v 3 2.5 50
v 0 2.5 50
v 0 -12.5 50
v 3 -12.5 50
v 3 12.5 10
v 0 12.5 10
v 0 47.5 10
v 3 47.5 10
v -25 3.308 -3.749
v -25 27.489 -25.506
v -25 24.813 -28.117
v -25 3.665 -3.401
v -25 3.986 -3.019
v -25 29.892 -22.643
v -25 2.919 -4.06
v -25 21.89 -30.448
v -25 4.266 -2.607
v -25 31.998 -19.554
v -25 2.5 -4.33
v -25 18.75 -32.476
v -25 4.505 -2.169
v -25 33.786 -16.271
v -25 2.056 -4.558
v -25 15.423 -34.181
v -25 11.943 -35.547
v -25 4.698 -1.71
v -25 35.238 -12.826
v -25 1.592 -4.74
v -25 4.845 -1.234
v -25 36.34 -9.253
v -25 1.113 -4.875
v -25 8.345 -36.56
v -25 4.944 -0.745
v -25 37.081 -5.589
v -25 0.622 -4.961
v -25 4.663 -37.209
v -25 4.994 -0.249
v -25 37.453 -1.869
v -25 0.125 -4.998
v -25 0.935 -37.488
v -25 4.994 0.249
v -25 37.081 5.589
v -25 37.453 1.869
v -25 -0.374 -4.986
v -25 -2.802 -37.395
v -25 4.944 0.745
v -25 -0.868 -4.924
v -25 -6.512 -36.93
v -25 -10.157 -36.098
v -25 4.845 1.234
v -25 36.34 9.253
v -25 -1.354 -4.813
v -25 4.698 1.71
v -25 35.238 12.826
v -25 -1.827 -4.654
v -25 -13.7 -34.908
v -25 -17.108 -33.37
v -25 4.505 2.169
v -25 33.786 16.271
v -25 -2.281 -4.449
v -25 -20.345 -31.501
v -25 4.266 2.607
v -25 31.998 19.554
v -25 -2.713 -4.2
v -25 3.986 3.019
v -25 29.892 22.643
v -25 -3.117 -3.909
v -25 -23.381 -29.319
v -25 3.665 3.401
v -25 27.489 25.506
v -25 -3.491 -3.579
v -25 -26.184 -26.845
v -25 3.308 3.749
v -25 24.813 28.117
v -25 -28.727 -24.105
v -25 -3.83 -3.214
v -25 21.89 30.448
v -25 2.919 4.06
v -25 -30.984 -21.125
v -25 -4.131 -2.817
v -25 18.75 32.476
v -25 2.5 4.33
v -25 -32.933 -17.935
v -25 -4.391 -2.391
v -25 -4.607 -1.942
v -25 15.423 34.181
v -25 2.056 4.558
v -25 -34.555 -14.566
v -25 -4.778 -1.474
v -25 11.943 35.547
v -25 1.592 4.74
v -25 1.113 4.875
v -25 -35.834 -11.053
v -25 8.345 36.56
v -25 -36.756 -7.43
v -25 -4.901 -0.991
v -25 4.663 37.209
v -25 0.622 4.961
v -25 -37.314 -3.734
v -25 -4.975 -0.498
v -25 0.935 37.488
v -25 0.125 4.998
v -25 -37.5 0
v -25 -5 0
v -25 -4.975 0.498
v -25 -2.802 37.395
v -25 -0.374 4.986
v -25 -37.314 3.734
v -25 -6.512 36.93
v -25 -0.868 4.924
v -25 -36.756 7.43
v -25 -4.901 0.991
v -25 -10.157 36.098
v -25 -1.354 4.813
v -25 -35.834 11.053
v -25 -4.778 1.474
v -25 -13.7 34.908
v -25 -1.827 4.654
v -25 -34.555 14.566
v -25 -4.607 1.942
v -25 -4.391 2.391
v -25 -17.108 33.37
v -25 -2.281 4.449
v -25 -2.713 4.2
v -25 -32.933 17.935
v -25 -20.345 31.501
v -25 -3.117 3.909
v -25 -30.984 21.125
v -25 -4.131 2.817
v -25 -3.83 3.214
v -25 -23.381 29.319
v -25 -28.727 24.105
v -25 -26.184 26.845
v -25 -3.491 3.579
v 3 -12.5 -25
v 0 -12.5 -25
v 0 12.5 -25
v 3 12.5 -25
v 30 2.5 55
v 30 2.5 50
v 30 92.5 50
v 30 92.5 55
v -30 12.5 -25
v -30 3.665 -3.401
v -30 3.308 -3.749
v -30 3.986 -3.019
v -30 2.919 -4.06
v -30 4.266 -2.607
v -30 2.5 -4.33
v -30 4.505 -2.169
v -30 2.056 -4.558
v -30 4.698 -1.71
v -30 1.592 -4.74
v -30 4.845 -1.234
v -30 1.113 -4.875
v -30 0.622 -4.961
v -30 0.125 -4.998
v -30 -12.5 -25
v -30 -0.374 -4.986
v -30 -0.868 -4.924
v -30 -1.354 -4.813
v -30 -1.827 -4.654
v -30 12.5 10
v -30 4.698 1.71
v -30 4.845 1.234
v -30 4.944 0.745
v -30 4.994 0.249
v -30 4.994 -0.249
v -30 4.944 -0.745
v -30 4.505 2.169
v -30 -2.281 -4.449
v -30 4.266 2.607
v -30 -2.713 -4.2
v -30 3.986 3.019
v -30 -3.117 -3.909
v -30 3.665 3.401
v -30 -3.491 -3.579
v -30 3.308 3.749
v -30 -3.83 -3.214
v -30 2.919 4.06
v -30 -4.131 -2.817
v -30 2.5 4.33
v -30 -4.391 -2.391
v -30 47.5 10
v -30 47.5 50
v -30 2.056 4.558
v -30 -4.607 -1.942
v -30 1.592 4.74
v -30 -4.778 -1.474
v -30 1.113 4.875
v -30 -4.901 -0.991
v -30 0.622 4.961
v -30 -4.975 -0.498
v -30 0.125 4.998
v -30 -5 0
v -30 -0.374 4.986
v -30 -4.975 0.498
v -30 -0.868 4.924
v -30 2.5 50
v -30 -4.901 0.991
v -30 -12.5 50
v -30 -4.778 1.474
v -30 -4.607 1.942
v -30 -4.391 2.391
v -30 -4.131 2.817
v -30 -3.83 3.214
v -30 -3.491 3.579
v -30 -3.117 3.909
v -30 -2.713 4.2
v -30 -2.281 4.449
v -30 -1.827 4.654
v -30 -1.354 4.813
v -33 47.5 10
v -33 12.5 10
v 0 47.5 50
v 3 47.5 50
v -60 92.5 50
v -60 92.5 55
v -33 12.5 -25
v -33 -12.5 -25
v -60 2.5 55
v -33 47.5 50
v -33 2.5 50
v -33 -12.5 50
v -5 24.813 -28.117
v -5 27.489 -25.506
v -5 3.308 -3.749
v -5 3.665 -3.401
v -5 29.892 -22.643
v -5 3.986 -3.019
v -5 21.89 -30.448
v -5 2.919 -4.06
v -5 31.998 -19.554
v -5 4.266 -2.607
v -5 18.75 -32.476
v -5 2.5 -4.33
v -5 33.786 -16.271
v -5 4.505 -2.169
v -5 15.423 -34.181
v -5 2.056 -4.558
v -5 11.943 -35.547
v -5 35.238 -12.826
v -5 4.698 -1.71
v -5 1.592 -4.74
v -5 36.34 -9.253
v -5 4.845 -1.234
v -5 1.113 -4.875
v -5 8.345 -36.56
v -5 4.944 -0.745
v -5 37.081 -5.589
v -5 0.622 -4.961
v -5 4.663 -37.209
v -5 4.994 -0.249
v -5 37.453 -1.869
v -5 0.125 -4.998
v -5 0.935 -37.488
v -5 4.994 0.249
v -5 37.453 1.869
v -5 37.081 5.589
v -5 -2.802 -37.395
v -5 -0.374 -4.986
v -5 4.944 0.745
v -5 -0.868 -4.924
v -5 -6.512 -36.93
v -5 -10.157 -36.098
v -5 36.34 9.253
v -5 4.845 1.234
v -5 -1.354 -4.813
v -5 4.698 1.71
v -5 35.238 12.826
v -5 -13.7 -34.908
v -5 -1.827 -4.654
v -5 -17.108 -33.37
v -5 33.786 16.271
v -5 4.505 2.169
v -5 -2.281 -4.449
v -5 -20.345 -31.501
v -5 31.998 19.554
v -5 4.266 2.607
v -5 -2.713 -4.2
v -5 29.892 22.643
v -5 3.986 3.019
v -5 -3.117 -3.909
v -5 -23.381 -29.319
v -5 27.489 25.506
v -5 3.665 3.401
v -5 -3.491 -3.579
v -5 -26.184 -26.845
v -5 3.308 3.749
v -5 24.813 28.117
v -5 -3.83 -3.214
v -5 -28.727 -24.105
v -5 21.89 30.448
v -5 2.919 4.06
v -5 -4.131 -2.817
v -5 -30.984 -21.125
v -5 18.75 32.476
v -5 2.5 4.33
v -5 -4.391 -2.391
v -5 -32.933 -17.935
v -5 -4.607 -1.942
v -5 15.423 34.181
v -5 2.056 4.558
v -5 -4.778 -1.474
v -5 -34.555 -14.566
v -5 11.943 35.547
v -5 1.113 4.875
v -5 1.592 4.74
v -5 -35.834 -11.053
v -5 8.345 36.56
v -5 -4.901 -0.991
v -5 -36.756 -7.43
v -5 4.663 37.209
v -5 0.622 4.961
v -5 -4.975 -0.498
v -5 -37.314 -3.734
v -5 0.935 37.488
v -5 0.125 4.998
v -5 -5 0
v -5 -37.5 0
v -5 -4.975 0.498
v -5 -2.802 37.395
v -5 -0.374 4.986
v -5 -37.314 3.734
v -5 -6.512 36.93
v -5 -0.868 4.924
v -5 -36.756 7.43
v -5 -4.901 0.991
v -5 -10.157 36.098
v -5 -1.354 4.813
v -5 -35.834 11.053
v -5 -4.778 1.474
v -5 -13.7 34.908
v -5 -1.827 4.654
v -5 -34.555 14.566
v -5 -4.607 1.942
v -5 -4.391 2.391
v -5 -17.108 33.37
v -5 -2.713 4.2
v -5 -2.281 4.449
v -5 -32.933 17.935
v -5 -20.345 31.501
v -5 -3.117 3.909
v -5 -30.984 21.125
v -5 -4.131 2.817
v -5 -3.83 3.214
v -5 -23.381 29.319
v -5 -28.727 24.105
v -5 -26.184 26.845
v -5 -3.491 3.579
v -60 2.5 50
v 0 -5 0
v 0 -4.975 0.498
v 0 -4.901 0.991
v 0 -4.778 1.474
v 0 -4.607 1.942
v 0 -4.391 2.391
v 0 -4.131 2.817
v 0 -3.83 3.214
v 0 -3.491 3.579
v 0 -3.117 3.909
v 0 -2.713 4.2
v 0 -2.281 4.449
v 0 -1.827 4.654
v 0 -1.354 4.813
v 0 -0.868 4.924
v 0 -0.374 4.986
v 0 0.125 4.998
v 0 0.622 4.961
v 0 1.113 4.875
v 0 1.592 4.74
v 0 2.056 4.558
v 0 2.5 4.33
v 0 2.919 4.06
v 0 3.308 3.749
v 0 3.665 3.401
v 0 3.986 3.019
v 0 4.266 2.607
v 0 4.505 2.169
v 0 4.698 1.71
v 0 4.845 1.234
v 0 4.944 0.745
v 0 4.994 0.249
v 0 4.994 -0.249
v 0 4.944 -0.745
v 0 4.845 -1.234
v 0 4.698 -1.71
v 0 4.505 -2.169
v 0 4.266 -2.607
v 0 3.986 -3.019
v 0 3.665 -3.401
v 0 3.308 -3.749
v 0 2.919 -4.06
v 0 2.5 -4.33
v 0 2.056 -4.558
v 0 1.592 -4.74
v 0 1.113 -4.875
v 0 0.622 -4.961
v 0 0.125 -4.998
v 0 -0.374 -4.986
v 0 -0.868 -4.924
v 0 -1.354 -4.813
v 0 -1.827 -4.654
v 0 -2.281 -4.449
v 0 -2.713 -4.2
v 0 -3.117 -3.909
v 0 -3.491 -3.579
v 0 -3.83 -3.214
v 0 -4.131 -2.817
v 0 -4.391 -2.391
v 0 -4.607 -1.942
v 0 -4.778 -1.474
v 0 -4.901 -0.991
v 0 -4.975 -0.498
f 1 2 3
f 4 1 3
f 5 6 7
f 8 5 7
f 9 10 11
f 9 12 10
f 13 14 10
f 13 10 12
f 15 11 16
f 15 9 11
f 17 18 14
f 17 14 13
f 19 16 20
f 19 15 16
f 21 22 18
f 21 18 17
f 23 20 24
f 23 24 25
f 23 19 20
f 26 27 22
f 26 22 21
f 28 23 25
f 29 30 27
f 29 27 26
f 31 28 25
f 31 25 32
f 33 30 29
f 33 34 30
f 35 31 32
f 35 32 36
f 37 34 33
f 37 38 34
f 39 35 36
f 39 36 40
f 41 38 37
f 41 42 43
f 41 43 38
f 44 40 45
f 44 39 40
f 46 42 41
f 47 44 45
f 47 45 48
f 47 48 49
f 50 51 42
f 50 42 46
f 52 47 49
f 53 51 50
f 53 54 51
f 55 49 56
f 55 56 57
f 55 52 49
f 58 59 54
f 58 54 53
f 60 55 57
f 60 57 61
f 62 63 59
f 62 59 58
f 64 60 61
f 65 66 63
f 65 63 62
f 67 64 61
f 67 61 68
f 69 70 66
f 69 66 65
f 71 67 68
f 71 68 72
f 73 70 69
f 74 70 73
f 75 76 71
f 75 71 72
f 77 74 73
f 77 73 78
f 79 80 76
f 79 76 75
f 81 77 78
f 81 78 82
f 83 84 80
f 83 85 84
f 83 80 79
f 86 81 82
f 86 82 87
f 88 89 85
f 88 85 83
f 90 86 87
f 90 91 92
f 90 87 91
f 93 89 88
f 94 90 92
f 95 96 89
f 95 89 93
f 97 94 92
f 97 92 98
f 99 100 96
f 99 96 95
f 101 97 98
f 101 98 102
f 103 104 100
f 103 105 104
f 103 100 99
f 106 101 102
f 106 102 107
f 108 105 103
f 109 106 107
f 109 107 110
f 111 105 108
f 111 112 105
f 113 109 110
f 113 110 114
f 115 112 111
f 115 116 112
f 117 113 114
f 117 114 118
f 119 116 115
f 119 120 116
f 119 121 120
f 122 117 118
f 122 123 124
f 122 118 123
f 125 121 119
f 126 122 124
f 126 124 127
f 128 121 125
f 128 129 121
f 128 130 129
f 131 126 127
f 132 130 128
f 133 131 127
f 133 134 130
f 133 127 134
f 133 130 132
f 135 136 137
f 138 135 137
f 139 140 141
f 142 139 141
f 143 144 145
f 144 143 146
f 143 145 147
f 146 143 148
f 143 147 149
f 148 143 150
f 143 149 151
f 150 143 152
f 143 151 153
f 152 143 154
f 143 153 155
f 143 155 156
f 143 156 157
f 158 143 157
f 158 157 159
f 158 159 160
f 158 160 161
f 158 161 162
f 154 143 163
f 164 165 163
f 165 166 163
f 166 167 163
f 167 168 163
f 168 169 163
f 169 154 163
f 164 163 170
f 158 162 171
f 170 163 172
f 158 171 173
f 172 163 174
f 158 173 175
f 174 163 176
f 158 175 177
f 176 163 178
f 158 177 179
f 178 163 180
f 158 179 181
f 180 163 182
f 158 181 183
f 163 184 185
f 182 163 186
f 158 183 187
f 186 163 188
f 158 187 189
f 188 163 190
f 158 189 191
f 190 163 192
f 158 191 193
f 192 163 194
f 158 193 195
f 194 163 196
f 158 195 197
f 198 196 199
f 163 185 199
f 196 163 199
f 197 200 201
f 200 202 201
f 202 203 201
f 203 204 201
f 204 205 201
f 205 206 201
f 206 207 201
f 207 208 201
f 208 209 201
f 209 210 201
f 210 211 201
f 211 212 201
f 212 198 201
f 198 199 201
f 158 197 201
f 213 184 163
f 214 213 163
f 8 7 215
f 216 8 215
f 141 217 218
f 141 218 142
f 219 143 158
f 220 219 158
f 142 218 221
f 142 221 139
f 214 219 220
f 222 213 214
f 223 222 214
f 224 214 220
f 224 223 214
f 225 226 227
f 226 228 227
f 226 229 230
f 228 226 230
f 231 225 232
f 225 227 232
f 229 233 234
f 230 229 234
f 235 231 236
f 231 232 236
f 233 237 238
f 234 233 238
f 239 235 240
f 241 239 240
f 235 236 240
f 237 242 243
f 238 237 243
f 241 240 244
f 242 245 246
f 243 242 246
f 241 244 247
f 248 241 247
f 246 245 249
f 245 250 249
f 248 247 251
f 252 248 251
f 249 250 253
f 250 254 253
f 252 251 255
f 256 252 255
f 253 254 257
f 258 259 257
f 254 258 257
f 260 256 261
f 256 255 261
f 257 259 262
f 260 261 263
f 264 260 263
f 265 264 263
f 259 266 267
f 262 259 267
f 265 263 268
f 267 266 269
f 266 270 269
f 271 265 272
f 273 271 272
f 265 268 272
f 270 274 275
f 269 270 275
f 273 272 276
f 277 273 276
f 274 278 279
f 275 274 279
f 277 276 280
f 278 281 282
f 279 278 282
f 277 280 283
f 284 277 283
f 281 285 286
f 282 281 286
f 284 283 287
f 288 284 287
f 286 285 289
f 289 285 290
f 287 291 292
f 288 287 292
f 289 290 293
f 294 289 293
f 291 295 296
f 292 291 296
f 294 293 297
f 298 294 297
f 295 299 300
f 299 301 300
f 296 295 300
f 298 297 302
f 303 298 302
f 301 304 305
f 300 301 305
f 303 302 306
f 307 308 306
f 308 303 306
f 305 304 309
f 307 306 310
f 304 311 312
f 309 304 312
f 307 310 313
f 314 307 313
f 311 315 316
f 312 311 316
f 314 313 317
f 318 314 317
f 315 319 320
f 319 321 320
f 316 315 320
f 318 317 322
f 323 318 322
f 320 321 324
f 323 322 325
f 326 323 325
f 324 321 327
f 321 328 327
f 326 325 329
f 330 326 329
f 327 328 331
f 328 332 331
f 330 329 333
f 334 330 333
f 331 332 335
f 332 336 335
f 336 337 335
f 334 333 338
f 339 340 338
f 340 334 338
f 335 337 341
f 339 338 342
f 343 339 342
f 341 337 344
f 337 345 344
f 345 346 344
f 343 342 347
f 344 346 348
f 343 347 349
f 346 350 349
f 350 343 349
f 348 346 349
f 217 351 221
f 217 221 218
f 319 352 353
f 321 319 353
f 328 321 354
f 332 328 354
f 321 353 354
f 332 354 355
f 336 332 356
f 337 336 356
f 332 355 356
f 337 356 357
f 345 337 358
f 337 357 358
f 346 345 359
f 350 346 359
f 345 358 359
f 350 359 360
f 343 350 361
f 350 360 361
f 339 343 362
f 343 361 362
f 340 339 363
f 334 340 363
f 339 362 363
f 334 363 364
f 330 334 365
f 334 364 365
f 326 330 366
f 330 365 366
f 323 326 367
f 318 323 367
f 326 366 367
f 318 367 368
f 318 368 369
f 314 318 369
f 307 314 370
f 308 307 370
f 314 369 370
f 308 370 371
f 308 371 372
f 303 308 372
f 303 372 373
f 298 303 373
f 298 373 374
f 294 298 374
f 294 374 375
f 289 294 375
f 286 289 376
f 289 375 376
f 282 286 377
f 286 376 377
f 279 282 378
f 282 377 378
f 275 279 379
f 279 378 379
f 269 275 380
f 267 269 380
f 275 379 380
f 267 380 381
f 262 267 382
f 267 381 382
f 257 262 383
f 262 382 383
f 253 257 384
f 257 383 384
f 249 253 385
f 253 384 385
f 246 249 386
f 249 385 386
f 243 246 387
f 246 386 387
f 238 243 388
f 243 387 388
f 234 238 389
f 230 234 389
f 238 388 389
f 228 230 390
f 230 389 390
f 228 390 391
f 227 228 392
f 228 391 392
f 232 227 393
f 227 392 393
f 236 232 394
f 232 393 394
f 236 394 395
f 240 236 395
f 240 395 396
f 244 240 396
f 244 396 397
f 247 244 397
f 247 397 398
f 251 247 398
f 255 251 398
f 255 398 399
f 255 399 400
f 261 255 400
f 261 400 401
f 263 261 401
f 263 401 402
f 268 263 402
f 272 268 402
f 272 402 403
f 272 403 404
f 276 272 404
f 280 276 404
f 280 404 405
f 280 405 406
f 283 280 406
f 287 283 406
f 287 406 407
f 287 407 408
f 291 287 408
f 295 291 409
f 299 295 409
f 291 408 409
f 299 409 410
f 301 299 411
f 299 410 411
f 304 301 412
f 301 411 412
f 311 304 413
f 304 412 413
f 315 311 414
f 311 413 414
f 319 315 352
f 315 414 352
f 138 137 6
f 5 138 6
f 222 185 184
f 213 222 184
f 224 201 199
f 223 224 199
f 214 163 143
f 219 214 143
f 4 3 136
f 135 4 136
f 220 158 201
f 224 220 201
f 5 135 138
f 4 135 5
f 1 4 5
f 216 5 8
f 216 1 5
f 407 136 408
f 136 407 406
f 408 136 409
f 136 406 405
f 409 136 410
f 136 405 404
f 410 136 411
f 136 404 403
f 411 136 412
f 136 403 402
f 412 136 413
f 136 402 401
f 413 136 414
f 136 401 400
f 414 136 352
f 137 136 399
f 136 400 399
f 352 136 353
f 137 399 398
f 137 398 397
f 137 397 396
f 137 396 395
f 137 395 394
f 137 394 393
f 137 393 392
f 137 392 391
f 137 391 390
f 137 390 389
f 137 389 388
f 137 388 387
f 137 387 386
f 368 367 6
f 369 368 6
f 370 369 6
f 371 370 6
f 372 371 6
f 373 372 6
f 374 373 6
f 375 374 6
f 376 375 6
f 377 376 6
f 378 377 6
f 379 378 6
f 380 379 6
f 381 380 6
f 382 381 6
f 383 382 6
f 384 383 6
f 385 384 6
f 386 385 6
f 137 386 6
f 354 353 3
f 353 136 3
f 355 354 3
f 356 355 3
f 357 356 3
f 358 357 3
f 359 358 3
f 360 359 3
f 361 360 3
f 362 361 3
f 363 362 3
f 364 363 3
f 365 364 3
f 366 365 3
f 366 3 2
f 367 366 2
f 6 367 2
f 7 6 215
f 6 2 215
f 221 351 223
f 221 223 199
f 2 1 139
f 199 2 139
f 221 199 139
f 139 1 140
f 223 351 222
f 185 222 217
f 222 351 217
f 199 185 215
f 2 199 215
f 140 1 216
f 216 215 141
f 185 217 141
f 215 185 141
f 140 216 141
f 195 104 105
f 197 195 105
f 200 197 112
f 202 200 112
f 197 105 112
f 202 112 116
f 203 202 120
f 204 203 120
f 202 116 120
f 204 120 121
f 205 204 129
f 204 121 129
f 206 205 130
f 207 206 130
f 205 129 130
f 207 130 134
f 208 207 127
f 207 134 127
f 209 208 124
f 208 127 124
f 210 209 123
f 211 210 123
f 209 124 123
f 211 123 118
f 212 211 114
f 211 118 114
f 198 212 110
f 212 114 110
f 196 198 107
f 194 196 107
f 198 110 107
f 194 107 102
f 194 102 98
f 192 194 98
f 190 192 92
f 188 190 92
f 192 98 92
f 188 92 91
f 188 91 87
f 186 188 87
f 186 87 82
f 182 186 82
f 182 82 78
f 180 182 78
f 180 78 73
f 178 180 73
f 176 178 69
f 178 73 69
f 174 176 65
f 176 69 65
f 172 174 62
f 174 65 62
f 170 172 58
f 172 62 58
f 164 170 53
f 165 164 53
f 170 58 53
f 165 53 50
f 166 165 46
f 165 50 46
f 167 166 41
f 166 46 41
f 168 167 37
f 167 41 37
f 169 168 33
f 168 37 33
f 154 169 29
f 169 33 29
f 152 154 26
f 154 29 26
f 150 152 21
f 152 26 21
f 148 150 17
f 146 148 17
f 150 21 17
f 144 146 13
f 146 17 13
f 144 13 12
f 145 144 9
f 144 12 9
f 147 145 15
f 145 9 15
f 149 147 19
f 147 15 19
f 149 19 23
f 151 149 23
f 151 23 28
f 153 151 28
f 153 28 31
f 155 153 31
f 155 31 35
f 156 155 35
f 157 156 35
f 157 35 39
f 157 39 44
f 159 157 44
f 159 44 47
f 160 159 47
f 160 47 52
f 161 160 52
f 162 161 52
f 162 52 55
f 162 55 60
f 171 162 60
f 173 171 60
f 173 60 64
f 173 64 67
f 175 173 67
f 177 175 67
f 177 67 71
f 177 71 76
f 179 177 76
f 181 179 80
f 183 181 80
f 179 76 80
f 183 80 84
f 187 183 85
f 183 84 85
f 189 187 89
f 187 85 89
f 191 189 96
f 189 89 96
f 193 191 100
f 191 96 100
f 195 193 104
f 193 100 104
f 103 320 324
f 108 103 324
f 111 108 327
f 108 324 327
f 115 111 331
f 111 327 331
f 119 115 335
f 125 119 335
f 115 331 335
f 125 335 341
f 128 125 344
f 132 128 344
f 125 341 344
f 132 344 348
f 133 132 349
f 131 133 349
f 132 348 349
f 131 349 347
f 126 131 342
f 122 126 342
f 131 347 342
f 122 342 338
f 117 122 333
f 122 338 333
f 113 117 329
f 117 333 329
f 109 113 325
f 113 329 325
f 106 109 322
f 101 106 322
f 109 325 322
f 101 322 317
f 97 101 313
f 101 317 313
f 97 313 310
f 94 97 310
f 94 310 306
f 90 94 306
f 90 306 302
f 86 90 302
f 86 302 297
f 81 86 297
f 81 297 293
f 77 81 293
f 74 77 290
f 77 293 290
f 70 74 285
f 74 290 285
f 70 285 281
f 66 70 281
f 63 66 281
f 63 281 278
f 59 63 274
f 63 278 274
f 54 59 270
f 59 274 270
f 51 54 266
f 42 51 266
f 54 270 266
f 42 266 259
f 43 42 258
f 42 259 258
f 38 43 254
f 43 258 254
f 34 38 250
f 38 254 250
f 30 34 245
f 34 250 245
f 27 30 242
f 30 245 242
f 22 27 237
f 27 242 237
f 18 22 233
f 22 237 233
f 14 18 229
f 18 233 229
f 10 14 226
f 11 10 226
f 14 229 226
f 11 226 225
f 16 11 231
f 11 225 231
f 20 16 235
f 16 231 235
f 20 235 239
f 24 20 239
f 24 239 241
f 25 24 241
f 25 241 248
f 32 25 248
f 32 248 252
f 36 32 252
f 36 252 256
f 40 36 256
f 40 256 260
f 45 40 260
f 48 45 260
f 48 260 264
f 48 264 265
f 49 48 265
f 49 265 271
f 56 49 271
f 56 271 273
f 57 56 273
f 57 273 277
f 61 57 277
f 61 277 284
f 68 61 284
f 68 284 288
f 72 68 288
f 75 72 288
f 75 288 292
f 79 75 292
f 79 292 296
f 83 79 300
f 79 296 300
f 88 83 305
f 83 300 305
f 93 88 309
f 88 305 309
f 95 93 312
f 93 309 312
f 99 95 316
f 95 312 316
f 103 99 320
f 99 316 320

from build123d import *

# Parameters (mm, degrees)
F1_DEPTH  = 3
F2_R      = 5
F3_DEPTH  = 5
F4_R      = 37.5
F5_DEPTH  = 20
F6_R      = 5
F7_DEPTH  = 5
F9_DEPTH  = 3
F10_W     = 90
F10_H     = 90
F11_DEPTH = 5


with BuildPart() as f1:
    # F0 (on Right) → F1 (new body)
    with BuildSketch(Plane.YZ):
        Polygon((-12.5, 50), (-12.5, -25), (12.5, -25), (12.5, 10), (47.5, 10), (47.5, 50), align=None)
    extrude(amount=F1_DEPTH)

    # F2 (on face) → F3 (join)
    with BuildSketch(Plane(origin=(0, 0, 0), x_dir=(0, -1, 0), z_dir=(-1, 0, 0))):
        Circle(F2_R)
    extrude(amount=F3_DEPTH)

    # F4 (on face) → F5 (join)
    with BuildSketch(Plane(origin=(-5, 0, 0), x_dir=(0, -1, 0), z_dir=(-1, 0, 0))):
        Circle(F4_R)
    extrude(amount=F5_DEPTH)

    # F6 (on face) → F7 (join)
    with BuildSketch(Plane(origin=(-25, 0, 0), x_dir=(0, -1, 0), z_dir=(-1, 0, 0))):
        Circle(F6_R)
    extrude(amount=F7_DEPTH)

    # F8 (on face) → F9 (join)
    with BuildSketch(Plane(origin=(-30, 0, 0), x_dir=(0, -1, 0), z_dir=(-1, 0, 0))):
        Polygon((12.5, 50), (-47.5, 50), (-47.5, 10), (-12.5, 10), (-12.5, -25), (12.5, -25), align=None)
    extrude(amount=F9_DEPTH)

    # F10 (on face) → F11 (join)
    with BuildSketch(Plane.XY.offset(50)):
        with Locations((-15, 47.5)):
            Rectangle(F10_W, F10_H)
    extrude(amount=F11_DEPTH)


solid = f1.part
